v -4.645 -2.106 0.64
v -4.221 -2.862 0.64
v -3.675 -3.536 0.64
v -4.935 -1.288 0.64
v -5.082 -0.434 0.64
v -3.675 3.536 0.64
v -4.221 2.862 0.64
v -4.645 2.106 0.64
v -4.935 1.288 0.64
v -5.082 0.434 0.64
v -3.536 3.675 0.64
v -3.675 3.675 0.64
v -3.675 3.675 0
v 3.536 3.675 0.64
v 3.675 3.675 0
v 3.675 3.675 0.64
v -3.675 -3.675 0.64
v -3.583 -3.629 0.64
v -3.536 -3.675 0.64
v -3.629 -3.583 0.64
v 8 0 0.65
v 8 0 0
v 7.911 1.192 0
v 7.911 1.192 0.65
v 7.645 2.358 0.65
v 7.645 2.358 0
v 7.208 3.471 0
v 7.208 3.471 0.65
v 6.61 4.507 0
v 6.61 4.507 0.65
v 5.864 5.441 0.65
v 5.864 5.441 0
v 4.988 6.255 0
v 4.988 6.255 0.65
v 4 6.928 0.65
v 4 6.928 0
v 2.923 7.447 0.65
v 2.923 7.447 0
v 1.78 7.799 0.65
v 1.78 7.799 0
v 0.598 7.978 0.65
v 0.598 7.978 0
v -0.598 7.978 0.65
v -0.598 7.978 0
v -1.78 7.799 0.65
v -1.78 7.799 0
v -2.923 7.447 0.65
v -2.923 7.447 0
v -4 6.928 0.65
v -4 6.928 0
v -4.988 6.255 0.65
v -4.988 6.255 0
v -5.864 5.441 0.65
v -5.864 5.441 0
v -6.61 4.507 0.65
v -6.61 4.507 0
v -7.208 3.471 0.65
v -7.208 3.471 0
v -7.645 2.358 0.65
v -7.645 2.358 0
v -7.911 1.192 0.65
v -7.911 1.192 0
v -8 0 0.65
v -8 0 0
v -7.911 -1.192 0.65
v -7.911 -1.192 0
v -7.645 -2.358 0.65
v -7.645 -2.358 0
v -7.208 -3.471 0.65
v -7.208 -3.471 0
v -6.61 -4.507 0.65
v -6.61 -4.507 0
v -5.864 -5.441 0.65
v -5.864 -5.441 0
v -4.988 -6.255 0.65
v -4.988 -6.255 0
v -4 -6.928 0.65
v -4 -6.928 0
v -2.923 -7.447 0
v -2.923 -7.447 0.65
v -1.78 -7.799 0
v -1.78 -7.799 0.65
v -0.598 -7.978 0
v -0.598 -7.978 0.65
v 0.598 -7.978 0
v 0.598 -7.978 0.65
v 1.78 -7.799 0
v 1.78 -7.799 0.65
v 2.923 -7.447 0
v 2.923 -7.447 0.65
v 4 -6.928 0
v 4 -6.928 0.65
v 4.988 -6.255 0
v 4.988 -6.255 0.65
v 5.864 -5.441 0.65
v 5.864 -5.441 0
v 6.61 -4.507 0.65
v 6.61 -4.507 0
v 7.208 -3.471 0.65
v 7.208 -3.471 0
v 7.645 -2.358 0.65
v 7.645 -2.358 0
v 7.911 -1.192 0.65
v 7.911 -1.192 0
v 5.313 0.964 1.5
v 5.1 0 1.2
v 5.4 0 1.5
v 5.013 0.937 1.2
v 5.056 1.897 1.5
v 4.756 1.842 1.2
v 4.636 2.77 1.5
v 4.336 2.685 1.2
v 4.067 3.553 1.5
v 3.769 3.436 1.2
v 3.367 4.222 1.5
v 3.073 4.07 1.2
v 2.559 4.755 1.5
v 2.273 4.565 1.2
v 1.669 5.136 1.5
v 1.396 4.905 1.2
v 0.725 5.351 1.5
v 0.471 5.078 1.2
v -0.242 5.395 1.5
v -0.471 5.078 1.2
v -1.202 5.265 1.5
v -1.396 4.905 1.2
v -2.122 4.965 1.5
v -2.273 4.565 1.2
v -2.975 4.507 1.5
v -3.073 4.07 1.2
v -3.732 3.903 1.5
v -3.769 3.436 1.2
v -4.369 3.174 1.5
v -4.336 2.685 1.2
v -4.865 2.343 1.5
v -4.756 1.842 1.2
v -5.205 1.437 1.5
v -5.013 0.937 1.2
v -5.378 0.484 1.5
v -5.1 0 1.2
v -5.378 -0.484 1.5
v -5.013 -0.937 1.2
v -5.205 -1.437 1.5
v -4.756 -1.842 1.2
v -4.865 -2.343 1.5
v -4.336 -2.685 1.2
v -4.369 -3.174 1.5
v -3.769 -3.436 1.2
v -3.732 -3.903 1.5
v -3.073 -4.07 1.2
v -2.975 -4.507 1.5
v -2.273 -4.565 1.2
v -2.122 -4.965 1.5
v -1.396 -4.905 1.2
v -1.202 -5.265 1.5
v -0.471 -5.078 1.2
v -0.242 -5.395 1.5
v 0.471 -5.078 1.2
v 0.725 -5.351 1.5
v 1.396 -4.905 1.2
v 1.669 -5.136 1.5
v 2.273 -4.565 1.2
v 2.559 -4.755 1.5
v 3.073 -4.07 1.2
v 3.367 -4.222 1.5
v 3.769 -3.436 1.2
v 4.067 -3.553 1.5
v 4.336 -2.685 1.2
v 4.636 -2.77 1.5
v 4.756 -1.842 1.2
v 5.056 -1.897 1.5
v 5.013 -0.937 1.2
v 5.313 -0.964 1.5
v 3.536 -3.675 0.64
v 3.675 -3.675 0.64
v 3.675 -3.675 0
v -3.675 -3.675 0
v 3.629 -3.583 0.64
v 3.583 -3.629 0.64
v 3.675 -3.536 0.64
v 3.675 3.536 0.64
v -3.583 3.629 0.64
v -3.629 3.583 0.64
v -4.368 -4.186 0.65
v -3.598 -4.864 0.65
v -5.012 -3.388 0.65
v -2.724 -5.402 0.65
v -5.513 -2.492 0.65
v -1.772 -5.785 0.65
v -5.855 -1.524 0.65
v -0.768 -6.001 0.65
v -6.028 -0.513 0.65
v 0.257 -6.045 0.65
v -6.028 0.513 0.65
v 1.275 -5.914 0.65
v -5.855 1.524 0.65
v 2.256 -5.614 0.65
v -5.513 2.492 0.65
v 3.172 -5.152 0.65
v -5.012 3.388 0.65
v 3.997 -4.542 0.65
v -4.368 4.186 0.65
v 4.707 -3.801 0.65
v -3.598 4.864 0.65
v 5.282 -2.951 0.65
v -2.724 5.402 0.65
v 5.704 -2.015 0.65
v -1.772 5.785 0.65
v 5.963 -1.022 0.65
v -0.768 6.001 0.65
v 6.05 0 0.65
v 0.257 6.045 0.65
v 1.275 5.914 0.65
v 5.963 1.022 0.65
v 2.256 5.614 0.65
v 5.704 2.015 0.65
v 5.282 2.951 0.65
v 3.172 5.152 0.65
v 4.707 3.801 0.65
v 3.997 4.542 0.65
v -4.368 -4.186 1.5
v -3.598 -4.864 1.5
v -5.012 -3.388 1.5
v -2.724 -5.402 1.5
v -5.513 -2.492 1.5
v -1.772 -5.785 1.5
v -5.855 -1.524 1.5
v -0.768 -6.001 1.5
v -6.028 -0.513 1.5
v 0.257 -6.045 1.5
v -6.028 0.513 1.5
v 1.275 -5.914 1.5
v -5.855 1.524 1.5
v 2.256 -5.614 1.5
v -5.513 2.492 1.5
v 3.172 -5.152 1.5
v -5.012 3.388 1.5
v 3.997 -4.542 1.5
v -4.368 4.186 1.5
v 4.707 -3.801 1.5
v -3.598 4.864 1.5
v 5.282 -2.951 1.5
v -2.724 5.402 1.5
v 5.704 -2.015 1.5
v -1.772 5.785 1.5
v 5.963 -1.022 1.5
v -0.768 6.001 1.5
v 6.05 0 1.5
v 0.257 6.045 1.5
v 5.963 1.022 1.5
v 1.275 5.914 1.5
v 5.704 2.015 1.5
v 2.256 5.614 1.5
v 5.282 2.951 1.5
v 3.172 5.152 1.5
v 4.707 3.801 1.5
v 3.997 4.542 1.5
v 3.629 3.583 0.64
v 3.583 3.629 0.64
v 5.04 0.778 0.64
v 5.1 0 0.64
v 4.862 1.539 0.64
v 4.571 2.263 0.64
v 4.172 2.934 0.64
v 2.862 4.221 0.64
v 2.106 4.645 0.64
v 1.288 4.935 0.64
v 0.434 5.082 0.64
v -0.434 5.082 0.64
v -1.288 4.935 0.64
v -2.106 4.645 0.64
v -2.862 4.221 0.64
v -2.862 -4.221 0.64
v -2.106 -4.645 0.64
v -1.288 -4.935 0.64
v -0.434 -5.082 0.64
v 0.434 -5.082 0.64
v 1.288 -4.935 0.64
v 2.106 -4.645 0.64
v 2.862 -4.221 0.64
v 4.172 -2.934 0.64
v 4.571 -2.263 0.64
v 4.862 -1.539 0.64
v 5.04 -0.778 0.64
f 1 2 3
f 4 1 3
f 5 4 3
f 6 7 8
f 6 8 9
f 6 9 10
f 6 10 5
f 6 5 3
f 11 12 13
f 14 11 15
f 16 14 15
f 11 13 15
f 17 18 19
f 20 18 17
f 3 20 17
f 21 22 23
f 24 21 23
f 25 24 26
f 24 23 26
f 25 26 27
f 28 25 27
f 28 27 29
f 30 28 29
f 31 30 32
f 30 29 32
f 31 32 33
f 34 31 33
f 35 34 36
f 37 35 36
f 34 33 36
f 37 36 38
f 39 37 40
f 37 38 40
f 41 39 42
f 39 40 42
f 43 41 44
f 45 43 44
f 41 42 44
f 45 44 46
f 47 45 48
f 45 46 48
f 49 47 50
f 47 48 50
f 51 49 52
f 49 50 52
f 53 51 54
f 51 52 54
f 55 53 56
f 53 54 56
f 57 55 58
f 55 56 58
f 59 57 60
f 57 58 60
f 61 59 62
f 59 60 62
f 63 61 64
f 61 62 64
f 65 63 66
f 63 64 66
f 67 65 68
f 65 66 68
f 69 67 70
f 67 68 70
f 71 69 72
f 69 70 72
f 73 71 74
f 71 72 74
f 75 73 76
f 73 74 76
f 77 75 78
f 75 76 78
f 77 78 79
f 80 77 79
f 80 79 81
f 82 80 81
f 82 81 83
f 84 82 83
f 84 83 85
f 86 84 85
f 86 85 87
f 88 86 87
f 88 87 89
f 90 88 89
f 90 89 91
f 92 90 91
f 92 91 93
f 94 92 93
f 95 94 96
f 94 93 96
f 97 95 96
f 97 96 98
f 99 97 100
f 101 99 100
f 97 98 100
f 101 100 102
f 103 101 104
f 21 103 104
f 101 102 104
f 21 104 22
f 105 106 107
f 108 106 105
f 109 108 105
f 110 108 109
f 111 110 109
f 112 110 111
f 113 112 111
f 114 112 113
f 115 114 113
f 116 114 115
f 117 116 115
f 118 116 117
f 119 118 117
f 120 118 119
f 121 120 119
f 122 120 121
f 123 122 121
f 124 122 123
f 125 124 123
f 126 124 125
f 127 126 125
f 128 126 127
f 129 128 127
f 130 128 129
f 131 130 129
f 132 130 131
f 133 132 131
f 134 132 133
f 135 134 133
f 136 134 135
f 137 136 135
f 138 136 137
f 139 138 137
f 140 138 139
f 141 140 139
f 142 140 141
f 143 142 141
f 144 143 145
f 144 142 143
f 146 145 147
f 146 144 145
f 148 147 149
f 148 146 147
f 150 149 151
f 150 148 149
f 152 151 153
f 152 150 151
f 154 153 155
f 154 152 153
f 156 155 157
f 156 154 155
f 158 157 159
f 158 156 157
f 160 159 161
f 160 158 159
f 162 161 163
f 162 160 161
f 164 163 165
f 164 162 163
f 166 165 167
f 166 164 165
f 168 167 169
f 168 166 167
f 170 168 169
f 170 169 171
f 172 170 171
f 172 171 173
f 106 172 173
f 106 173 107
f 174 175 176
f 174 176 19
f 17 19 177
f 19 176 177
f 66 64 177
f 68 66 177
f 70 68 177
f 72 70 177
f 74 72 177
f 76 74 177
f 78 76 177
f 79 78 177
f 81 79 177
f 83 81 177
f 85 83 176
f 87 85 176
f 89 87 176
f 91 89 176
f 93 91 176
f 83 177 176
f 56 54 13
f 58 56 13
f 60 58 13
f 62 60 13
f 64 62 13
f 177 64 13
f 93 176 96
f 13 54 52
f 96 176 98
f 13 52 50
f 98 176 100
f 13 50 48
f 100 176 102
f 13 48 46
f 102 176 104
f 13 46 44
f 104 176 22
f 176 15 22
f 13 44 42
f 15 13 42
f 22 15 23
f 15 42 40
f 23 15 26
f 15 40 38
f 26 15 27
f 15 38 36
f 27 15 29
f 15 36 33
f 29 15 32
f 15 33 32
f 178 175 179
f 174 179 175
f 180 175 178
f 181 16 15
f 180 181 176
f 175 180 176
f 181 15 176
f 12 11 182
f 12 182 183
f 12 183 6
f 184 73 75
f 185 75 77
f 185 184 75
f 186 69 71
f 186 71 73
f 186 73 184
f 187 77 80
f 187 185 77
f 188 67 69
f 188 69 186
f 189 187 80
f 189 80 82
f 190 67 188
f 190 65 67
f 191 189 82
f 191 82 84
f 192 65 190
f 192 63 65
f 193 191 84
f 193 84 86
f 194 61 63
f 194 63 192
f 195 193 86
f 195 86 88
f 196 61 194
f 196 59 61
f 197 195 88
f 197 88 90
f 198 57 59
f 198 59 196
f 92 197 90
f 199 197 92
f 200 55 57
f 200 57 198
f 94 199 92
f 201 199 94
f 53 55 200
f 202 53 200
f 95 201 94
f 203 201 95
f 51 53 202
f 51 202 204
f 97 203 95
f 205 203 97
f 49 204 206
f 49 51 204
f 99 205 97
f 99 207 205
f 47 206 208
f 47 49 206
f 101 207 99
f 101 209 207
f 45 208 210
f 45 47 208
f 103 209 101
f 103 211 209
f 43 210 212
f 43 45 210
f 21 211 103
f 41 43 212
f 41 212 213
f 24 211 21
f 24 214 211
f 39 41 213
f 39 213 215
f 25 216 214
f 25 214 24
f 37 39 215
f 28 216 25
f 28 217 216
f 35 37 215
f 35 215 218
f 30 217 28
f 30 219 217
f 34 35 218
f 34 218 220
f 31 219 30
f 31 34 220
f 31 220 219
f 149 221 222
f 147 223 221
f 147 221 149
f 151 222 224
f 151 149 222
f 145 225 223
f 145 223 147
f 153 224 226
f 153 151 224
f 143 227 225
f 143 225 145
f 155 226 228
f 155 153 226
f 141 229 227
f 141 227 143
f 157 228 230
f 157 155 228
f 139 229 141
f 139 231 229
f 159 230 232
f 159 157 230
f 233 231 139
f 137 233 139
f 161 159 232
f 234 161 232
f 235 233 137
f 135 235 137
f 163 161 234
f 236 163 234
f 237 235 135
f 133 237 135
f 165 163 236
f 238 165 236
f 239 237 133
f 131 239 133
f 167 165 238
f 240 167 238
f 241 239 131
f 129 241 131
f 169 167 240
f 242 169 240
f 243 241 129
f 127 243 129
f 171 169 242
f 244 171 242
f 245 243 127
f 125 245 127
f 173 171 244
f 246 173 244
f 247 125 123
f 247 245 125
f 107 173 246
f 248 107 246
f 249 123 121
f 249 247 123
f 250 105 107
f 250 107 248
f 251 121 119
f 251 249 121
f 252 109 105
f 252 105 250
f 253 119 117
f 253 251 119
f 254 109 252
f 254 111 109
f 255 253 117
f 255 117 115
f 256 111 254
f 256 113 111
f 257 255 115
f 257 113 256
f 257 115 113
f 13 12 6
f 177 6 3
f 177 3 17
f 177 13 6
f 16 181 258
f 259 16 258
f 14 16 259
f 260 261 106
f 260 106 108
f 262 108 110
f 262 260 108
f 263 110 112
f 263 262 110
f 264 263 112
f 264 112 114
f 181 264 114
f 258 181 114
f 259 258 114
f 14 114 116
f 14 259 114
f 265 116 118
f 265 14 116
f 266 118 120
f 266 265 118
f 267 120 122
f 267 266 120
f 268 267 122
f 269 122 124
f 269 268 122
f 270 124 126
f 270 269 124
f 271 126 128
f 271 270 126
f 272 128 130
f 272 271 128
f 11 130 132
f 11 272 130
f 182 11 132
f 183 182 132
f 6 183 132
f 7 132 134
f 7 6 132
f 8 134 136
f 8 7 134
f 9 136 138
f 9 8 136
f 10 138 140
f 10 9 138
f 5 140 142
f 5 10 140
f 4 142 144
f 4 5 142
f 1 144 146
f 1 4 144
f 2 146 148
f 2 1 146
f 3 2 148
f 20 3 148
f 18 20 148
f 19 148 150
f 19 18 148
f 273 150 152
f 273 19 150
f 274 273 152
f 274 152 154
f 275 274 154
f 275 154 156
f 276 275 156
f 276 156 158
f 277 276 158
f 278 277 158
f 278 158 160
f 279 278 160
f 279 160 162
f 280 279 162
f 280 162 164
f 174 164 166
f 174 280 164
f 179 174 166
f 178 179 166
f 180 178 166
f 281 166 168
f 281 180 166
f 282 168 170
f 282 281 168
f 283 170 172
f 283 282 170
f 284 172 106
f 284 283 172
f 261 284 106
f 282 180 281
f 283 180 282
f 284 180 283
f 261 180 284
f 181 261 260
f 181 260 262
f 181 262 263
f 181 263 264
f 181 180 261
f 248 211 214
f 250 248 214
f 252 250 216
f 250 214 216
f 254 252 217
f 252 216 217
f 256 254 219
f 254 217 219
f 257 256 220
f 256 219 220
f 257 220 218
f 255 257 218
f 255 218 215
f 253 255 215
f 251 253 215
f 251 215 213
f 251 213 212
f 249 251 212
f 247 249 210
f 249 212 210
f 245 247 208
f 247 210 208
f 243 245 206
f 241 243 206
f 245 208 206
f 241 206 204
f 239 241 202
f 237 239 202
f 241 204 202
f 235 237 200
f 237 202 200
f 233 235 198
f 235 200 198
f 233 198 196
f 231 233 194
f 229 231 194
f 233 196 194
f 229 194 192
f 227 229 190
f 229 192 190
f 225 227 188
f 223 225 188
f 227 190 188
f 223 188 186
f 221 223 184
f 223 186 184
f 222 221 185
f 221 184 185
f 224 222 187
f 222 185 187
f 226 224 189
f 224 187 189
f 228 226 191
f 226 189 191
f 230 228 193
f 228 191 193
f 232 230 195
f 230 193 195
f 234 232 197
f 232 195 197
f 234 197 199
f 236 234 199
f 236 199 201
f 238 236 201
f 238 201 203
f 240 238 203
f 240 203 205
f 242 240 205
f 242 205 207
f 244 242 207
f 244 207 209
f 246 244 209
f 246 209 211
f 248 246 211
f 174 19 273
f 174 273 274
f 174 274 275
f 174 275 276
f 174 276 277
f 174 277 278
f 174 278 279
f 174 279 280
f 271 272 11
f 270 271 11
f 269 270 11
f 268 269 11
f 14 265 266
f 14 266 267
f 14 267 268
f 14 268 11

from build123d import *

# Parameters (mm, degrees)
SKETCH_1_R          = 8
EXTRUDE_1_DEPTH     = 0.65
EXTRUDE_START       = 0.65
SKETCH_2_R          = 6.05
SKETCH_2_R_2        = 5.1
EXTRUDE_2_DEPTH     = 0.85
CUT_EXTRUDE_START   = 0.65
SKETCH_3_R          = 5.1
CUT_EXTRUDE_1_DEPTH = 0.01
CUT_EXTRUDE_2_DEPTH = 0.64
CHAMFER_1_SIZE      = 0.3


with BuildPart() as part:
    # 草图1 → 凸台-拉伸1 (new body)
    with BuildSketch(Plane.XY):
        Circle(SKETCH_1_R)
    extrude(amount=EXTRUDE_1_DEPTH)

    # 草图2 → 凸台-拉伸2 (add)
    with BuildSketch(Plane.XY.offset(EXTRUDE_START)):
        Circle(SKETCH_2_R)
        Circle(SKETCH_2_R_2, mode=Mode.SUBTRACT)
    extrude(amount=EXTRUDE_2_DEPTH)

    # 草图3 → 切除-拉伸1 (cut)
    with BuildSketch(Plane.XY.offset(CUT_EXTRUDE_START)):
        Circle(SKETCH_3_R)
    extrude(amount=-CUT_EXTRUDE_1_DEPTH, mode=Mode.SUBTRACT)

    # 草图4 → 切除-拉伸2 (cut)
    with BuildSketch(Plane.XY):
        Polygon((3.675, 3.675), (3.675, -3.675), (-3.675, -3.675), (-3.675, 0), (-3.675, 3.675), align=None)
    extrude(amount=CUT_EXTRUDE_2_DEPTH, mode=Mode.SUBTRACT)

    # 倒角1
    chamfer_1_edges = [part.edges().sort_by_distance(p)[0] for p in [
        (-5.1, 0, 1.5),
    ]]
    chamfer(chamfer_1_edges, length=CHAMFER_1_SIZE)


solid = part.part
